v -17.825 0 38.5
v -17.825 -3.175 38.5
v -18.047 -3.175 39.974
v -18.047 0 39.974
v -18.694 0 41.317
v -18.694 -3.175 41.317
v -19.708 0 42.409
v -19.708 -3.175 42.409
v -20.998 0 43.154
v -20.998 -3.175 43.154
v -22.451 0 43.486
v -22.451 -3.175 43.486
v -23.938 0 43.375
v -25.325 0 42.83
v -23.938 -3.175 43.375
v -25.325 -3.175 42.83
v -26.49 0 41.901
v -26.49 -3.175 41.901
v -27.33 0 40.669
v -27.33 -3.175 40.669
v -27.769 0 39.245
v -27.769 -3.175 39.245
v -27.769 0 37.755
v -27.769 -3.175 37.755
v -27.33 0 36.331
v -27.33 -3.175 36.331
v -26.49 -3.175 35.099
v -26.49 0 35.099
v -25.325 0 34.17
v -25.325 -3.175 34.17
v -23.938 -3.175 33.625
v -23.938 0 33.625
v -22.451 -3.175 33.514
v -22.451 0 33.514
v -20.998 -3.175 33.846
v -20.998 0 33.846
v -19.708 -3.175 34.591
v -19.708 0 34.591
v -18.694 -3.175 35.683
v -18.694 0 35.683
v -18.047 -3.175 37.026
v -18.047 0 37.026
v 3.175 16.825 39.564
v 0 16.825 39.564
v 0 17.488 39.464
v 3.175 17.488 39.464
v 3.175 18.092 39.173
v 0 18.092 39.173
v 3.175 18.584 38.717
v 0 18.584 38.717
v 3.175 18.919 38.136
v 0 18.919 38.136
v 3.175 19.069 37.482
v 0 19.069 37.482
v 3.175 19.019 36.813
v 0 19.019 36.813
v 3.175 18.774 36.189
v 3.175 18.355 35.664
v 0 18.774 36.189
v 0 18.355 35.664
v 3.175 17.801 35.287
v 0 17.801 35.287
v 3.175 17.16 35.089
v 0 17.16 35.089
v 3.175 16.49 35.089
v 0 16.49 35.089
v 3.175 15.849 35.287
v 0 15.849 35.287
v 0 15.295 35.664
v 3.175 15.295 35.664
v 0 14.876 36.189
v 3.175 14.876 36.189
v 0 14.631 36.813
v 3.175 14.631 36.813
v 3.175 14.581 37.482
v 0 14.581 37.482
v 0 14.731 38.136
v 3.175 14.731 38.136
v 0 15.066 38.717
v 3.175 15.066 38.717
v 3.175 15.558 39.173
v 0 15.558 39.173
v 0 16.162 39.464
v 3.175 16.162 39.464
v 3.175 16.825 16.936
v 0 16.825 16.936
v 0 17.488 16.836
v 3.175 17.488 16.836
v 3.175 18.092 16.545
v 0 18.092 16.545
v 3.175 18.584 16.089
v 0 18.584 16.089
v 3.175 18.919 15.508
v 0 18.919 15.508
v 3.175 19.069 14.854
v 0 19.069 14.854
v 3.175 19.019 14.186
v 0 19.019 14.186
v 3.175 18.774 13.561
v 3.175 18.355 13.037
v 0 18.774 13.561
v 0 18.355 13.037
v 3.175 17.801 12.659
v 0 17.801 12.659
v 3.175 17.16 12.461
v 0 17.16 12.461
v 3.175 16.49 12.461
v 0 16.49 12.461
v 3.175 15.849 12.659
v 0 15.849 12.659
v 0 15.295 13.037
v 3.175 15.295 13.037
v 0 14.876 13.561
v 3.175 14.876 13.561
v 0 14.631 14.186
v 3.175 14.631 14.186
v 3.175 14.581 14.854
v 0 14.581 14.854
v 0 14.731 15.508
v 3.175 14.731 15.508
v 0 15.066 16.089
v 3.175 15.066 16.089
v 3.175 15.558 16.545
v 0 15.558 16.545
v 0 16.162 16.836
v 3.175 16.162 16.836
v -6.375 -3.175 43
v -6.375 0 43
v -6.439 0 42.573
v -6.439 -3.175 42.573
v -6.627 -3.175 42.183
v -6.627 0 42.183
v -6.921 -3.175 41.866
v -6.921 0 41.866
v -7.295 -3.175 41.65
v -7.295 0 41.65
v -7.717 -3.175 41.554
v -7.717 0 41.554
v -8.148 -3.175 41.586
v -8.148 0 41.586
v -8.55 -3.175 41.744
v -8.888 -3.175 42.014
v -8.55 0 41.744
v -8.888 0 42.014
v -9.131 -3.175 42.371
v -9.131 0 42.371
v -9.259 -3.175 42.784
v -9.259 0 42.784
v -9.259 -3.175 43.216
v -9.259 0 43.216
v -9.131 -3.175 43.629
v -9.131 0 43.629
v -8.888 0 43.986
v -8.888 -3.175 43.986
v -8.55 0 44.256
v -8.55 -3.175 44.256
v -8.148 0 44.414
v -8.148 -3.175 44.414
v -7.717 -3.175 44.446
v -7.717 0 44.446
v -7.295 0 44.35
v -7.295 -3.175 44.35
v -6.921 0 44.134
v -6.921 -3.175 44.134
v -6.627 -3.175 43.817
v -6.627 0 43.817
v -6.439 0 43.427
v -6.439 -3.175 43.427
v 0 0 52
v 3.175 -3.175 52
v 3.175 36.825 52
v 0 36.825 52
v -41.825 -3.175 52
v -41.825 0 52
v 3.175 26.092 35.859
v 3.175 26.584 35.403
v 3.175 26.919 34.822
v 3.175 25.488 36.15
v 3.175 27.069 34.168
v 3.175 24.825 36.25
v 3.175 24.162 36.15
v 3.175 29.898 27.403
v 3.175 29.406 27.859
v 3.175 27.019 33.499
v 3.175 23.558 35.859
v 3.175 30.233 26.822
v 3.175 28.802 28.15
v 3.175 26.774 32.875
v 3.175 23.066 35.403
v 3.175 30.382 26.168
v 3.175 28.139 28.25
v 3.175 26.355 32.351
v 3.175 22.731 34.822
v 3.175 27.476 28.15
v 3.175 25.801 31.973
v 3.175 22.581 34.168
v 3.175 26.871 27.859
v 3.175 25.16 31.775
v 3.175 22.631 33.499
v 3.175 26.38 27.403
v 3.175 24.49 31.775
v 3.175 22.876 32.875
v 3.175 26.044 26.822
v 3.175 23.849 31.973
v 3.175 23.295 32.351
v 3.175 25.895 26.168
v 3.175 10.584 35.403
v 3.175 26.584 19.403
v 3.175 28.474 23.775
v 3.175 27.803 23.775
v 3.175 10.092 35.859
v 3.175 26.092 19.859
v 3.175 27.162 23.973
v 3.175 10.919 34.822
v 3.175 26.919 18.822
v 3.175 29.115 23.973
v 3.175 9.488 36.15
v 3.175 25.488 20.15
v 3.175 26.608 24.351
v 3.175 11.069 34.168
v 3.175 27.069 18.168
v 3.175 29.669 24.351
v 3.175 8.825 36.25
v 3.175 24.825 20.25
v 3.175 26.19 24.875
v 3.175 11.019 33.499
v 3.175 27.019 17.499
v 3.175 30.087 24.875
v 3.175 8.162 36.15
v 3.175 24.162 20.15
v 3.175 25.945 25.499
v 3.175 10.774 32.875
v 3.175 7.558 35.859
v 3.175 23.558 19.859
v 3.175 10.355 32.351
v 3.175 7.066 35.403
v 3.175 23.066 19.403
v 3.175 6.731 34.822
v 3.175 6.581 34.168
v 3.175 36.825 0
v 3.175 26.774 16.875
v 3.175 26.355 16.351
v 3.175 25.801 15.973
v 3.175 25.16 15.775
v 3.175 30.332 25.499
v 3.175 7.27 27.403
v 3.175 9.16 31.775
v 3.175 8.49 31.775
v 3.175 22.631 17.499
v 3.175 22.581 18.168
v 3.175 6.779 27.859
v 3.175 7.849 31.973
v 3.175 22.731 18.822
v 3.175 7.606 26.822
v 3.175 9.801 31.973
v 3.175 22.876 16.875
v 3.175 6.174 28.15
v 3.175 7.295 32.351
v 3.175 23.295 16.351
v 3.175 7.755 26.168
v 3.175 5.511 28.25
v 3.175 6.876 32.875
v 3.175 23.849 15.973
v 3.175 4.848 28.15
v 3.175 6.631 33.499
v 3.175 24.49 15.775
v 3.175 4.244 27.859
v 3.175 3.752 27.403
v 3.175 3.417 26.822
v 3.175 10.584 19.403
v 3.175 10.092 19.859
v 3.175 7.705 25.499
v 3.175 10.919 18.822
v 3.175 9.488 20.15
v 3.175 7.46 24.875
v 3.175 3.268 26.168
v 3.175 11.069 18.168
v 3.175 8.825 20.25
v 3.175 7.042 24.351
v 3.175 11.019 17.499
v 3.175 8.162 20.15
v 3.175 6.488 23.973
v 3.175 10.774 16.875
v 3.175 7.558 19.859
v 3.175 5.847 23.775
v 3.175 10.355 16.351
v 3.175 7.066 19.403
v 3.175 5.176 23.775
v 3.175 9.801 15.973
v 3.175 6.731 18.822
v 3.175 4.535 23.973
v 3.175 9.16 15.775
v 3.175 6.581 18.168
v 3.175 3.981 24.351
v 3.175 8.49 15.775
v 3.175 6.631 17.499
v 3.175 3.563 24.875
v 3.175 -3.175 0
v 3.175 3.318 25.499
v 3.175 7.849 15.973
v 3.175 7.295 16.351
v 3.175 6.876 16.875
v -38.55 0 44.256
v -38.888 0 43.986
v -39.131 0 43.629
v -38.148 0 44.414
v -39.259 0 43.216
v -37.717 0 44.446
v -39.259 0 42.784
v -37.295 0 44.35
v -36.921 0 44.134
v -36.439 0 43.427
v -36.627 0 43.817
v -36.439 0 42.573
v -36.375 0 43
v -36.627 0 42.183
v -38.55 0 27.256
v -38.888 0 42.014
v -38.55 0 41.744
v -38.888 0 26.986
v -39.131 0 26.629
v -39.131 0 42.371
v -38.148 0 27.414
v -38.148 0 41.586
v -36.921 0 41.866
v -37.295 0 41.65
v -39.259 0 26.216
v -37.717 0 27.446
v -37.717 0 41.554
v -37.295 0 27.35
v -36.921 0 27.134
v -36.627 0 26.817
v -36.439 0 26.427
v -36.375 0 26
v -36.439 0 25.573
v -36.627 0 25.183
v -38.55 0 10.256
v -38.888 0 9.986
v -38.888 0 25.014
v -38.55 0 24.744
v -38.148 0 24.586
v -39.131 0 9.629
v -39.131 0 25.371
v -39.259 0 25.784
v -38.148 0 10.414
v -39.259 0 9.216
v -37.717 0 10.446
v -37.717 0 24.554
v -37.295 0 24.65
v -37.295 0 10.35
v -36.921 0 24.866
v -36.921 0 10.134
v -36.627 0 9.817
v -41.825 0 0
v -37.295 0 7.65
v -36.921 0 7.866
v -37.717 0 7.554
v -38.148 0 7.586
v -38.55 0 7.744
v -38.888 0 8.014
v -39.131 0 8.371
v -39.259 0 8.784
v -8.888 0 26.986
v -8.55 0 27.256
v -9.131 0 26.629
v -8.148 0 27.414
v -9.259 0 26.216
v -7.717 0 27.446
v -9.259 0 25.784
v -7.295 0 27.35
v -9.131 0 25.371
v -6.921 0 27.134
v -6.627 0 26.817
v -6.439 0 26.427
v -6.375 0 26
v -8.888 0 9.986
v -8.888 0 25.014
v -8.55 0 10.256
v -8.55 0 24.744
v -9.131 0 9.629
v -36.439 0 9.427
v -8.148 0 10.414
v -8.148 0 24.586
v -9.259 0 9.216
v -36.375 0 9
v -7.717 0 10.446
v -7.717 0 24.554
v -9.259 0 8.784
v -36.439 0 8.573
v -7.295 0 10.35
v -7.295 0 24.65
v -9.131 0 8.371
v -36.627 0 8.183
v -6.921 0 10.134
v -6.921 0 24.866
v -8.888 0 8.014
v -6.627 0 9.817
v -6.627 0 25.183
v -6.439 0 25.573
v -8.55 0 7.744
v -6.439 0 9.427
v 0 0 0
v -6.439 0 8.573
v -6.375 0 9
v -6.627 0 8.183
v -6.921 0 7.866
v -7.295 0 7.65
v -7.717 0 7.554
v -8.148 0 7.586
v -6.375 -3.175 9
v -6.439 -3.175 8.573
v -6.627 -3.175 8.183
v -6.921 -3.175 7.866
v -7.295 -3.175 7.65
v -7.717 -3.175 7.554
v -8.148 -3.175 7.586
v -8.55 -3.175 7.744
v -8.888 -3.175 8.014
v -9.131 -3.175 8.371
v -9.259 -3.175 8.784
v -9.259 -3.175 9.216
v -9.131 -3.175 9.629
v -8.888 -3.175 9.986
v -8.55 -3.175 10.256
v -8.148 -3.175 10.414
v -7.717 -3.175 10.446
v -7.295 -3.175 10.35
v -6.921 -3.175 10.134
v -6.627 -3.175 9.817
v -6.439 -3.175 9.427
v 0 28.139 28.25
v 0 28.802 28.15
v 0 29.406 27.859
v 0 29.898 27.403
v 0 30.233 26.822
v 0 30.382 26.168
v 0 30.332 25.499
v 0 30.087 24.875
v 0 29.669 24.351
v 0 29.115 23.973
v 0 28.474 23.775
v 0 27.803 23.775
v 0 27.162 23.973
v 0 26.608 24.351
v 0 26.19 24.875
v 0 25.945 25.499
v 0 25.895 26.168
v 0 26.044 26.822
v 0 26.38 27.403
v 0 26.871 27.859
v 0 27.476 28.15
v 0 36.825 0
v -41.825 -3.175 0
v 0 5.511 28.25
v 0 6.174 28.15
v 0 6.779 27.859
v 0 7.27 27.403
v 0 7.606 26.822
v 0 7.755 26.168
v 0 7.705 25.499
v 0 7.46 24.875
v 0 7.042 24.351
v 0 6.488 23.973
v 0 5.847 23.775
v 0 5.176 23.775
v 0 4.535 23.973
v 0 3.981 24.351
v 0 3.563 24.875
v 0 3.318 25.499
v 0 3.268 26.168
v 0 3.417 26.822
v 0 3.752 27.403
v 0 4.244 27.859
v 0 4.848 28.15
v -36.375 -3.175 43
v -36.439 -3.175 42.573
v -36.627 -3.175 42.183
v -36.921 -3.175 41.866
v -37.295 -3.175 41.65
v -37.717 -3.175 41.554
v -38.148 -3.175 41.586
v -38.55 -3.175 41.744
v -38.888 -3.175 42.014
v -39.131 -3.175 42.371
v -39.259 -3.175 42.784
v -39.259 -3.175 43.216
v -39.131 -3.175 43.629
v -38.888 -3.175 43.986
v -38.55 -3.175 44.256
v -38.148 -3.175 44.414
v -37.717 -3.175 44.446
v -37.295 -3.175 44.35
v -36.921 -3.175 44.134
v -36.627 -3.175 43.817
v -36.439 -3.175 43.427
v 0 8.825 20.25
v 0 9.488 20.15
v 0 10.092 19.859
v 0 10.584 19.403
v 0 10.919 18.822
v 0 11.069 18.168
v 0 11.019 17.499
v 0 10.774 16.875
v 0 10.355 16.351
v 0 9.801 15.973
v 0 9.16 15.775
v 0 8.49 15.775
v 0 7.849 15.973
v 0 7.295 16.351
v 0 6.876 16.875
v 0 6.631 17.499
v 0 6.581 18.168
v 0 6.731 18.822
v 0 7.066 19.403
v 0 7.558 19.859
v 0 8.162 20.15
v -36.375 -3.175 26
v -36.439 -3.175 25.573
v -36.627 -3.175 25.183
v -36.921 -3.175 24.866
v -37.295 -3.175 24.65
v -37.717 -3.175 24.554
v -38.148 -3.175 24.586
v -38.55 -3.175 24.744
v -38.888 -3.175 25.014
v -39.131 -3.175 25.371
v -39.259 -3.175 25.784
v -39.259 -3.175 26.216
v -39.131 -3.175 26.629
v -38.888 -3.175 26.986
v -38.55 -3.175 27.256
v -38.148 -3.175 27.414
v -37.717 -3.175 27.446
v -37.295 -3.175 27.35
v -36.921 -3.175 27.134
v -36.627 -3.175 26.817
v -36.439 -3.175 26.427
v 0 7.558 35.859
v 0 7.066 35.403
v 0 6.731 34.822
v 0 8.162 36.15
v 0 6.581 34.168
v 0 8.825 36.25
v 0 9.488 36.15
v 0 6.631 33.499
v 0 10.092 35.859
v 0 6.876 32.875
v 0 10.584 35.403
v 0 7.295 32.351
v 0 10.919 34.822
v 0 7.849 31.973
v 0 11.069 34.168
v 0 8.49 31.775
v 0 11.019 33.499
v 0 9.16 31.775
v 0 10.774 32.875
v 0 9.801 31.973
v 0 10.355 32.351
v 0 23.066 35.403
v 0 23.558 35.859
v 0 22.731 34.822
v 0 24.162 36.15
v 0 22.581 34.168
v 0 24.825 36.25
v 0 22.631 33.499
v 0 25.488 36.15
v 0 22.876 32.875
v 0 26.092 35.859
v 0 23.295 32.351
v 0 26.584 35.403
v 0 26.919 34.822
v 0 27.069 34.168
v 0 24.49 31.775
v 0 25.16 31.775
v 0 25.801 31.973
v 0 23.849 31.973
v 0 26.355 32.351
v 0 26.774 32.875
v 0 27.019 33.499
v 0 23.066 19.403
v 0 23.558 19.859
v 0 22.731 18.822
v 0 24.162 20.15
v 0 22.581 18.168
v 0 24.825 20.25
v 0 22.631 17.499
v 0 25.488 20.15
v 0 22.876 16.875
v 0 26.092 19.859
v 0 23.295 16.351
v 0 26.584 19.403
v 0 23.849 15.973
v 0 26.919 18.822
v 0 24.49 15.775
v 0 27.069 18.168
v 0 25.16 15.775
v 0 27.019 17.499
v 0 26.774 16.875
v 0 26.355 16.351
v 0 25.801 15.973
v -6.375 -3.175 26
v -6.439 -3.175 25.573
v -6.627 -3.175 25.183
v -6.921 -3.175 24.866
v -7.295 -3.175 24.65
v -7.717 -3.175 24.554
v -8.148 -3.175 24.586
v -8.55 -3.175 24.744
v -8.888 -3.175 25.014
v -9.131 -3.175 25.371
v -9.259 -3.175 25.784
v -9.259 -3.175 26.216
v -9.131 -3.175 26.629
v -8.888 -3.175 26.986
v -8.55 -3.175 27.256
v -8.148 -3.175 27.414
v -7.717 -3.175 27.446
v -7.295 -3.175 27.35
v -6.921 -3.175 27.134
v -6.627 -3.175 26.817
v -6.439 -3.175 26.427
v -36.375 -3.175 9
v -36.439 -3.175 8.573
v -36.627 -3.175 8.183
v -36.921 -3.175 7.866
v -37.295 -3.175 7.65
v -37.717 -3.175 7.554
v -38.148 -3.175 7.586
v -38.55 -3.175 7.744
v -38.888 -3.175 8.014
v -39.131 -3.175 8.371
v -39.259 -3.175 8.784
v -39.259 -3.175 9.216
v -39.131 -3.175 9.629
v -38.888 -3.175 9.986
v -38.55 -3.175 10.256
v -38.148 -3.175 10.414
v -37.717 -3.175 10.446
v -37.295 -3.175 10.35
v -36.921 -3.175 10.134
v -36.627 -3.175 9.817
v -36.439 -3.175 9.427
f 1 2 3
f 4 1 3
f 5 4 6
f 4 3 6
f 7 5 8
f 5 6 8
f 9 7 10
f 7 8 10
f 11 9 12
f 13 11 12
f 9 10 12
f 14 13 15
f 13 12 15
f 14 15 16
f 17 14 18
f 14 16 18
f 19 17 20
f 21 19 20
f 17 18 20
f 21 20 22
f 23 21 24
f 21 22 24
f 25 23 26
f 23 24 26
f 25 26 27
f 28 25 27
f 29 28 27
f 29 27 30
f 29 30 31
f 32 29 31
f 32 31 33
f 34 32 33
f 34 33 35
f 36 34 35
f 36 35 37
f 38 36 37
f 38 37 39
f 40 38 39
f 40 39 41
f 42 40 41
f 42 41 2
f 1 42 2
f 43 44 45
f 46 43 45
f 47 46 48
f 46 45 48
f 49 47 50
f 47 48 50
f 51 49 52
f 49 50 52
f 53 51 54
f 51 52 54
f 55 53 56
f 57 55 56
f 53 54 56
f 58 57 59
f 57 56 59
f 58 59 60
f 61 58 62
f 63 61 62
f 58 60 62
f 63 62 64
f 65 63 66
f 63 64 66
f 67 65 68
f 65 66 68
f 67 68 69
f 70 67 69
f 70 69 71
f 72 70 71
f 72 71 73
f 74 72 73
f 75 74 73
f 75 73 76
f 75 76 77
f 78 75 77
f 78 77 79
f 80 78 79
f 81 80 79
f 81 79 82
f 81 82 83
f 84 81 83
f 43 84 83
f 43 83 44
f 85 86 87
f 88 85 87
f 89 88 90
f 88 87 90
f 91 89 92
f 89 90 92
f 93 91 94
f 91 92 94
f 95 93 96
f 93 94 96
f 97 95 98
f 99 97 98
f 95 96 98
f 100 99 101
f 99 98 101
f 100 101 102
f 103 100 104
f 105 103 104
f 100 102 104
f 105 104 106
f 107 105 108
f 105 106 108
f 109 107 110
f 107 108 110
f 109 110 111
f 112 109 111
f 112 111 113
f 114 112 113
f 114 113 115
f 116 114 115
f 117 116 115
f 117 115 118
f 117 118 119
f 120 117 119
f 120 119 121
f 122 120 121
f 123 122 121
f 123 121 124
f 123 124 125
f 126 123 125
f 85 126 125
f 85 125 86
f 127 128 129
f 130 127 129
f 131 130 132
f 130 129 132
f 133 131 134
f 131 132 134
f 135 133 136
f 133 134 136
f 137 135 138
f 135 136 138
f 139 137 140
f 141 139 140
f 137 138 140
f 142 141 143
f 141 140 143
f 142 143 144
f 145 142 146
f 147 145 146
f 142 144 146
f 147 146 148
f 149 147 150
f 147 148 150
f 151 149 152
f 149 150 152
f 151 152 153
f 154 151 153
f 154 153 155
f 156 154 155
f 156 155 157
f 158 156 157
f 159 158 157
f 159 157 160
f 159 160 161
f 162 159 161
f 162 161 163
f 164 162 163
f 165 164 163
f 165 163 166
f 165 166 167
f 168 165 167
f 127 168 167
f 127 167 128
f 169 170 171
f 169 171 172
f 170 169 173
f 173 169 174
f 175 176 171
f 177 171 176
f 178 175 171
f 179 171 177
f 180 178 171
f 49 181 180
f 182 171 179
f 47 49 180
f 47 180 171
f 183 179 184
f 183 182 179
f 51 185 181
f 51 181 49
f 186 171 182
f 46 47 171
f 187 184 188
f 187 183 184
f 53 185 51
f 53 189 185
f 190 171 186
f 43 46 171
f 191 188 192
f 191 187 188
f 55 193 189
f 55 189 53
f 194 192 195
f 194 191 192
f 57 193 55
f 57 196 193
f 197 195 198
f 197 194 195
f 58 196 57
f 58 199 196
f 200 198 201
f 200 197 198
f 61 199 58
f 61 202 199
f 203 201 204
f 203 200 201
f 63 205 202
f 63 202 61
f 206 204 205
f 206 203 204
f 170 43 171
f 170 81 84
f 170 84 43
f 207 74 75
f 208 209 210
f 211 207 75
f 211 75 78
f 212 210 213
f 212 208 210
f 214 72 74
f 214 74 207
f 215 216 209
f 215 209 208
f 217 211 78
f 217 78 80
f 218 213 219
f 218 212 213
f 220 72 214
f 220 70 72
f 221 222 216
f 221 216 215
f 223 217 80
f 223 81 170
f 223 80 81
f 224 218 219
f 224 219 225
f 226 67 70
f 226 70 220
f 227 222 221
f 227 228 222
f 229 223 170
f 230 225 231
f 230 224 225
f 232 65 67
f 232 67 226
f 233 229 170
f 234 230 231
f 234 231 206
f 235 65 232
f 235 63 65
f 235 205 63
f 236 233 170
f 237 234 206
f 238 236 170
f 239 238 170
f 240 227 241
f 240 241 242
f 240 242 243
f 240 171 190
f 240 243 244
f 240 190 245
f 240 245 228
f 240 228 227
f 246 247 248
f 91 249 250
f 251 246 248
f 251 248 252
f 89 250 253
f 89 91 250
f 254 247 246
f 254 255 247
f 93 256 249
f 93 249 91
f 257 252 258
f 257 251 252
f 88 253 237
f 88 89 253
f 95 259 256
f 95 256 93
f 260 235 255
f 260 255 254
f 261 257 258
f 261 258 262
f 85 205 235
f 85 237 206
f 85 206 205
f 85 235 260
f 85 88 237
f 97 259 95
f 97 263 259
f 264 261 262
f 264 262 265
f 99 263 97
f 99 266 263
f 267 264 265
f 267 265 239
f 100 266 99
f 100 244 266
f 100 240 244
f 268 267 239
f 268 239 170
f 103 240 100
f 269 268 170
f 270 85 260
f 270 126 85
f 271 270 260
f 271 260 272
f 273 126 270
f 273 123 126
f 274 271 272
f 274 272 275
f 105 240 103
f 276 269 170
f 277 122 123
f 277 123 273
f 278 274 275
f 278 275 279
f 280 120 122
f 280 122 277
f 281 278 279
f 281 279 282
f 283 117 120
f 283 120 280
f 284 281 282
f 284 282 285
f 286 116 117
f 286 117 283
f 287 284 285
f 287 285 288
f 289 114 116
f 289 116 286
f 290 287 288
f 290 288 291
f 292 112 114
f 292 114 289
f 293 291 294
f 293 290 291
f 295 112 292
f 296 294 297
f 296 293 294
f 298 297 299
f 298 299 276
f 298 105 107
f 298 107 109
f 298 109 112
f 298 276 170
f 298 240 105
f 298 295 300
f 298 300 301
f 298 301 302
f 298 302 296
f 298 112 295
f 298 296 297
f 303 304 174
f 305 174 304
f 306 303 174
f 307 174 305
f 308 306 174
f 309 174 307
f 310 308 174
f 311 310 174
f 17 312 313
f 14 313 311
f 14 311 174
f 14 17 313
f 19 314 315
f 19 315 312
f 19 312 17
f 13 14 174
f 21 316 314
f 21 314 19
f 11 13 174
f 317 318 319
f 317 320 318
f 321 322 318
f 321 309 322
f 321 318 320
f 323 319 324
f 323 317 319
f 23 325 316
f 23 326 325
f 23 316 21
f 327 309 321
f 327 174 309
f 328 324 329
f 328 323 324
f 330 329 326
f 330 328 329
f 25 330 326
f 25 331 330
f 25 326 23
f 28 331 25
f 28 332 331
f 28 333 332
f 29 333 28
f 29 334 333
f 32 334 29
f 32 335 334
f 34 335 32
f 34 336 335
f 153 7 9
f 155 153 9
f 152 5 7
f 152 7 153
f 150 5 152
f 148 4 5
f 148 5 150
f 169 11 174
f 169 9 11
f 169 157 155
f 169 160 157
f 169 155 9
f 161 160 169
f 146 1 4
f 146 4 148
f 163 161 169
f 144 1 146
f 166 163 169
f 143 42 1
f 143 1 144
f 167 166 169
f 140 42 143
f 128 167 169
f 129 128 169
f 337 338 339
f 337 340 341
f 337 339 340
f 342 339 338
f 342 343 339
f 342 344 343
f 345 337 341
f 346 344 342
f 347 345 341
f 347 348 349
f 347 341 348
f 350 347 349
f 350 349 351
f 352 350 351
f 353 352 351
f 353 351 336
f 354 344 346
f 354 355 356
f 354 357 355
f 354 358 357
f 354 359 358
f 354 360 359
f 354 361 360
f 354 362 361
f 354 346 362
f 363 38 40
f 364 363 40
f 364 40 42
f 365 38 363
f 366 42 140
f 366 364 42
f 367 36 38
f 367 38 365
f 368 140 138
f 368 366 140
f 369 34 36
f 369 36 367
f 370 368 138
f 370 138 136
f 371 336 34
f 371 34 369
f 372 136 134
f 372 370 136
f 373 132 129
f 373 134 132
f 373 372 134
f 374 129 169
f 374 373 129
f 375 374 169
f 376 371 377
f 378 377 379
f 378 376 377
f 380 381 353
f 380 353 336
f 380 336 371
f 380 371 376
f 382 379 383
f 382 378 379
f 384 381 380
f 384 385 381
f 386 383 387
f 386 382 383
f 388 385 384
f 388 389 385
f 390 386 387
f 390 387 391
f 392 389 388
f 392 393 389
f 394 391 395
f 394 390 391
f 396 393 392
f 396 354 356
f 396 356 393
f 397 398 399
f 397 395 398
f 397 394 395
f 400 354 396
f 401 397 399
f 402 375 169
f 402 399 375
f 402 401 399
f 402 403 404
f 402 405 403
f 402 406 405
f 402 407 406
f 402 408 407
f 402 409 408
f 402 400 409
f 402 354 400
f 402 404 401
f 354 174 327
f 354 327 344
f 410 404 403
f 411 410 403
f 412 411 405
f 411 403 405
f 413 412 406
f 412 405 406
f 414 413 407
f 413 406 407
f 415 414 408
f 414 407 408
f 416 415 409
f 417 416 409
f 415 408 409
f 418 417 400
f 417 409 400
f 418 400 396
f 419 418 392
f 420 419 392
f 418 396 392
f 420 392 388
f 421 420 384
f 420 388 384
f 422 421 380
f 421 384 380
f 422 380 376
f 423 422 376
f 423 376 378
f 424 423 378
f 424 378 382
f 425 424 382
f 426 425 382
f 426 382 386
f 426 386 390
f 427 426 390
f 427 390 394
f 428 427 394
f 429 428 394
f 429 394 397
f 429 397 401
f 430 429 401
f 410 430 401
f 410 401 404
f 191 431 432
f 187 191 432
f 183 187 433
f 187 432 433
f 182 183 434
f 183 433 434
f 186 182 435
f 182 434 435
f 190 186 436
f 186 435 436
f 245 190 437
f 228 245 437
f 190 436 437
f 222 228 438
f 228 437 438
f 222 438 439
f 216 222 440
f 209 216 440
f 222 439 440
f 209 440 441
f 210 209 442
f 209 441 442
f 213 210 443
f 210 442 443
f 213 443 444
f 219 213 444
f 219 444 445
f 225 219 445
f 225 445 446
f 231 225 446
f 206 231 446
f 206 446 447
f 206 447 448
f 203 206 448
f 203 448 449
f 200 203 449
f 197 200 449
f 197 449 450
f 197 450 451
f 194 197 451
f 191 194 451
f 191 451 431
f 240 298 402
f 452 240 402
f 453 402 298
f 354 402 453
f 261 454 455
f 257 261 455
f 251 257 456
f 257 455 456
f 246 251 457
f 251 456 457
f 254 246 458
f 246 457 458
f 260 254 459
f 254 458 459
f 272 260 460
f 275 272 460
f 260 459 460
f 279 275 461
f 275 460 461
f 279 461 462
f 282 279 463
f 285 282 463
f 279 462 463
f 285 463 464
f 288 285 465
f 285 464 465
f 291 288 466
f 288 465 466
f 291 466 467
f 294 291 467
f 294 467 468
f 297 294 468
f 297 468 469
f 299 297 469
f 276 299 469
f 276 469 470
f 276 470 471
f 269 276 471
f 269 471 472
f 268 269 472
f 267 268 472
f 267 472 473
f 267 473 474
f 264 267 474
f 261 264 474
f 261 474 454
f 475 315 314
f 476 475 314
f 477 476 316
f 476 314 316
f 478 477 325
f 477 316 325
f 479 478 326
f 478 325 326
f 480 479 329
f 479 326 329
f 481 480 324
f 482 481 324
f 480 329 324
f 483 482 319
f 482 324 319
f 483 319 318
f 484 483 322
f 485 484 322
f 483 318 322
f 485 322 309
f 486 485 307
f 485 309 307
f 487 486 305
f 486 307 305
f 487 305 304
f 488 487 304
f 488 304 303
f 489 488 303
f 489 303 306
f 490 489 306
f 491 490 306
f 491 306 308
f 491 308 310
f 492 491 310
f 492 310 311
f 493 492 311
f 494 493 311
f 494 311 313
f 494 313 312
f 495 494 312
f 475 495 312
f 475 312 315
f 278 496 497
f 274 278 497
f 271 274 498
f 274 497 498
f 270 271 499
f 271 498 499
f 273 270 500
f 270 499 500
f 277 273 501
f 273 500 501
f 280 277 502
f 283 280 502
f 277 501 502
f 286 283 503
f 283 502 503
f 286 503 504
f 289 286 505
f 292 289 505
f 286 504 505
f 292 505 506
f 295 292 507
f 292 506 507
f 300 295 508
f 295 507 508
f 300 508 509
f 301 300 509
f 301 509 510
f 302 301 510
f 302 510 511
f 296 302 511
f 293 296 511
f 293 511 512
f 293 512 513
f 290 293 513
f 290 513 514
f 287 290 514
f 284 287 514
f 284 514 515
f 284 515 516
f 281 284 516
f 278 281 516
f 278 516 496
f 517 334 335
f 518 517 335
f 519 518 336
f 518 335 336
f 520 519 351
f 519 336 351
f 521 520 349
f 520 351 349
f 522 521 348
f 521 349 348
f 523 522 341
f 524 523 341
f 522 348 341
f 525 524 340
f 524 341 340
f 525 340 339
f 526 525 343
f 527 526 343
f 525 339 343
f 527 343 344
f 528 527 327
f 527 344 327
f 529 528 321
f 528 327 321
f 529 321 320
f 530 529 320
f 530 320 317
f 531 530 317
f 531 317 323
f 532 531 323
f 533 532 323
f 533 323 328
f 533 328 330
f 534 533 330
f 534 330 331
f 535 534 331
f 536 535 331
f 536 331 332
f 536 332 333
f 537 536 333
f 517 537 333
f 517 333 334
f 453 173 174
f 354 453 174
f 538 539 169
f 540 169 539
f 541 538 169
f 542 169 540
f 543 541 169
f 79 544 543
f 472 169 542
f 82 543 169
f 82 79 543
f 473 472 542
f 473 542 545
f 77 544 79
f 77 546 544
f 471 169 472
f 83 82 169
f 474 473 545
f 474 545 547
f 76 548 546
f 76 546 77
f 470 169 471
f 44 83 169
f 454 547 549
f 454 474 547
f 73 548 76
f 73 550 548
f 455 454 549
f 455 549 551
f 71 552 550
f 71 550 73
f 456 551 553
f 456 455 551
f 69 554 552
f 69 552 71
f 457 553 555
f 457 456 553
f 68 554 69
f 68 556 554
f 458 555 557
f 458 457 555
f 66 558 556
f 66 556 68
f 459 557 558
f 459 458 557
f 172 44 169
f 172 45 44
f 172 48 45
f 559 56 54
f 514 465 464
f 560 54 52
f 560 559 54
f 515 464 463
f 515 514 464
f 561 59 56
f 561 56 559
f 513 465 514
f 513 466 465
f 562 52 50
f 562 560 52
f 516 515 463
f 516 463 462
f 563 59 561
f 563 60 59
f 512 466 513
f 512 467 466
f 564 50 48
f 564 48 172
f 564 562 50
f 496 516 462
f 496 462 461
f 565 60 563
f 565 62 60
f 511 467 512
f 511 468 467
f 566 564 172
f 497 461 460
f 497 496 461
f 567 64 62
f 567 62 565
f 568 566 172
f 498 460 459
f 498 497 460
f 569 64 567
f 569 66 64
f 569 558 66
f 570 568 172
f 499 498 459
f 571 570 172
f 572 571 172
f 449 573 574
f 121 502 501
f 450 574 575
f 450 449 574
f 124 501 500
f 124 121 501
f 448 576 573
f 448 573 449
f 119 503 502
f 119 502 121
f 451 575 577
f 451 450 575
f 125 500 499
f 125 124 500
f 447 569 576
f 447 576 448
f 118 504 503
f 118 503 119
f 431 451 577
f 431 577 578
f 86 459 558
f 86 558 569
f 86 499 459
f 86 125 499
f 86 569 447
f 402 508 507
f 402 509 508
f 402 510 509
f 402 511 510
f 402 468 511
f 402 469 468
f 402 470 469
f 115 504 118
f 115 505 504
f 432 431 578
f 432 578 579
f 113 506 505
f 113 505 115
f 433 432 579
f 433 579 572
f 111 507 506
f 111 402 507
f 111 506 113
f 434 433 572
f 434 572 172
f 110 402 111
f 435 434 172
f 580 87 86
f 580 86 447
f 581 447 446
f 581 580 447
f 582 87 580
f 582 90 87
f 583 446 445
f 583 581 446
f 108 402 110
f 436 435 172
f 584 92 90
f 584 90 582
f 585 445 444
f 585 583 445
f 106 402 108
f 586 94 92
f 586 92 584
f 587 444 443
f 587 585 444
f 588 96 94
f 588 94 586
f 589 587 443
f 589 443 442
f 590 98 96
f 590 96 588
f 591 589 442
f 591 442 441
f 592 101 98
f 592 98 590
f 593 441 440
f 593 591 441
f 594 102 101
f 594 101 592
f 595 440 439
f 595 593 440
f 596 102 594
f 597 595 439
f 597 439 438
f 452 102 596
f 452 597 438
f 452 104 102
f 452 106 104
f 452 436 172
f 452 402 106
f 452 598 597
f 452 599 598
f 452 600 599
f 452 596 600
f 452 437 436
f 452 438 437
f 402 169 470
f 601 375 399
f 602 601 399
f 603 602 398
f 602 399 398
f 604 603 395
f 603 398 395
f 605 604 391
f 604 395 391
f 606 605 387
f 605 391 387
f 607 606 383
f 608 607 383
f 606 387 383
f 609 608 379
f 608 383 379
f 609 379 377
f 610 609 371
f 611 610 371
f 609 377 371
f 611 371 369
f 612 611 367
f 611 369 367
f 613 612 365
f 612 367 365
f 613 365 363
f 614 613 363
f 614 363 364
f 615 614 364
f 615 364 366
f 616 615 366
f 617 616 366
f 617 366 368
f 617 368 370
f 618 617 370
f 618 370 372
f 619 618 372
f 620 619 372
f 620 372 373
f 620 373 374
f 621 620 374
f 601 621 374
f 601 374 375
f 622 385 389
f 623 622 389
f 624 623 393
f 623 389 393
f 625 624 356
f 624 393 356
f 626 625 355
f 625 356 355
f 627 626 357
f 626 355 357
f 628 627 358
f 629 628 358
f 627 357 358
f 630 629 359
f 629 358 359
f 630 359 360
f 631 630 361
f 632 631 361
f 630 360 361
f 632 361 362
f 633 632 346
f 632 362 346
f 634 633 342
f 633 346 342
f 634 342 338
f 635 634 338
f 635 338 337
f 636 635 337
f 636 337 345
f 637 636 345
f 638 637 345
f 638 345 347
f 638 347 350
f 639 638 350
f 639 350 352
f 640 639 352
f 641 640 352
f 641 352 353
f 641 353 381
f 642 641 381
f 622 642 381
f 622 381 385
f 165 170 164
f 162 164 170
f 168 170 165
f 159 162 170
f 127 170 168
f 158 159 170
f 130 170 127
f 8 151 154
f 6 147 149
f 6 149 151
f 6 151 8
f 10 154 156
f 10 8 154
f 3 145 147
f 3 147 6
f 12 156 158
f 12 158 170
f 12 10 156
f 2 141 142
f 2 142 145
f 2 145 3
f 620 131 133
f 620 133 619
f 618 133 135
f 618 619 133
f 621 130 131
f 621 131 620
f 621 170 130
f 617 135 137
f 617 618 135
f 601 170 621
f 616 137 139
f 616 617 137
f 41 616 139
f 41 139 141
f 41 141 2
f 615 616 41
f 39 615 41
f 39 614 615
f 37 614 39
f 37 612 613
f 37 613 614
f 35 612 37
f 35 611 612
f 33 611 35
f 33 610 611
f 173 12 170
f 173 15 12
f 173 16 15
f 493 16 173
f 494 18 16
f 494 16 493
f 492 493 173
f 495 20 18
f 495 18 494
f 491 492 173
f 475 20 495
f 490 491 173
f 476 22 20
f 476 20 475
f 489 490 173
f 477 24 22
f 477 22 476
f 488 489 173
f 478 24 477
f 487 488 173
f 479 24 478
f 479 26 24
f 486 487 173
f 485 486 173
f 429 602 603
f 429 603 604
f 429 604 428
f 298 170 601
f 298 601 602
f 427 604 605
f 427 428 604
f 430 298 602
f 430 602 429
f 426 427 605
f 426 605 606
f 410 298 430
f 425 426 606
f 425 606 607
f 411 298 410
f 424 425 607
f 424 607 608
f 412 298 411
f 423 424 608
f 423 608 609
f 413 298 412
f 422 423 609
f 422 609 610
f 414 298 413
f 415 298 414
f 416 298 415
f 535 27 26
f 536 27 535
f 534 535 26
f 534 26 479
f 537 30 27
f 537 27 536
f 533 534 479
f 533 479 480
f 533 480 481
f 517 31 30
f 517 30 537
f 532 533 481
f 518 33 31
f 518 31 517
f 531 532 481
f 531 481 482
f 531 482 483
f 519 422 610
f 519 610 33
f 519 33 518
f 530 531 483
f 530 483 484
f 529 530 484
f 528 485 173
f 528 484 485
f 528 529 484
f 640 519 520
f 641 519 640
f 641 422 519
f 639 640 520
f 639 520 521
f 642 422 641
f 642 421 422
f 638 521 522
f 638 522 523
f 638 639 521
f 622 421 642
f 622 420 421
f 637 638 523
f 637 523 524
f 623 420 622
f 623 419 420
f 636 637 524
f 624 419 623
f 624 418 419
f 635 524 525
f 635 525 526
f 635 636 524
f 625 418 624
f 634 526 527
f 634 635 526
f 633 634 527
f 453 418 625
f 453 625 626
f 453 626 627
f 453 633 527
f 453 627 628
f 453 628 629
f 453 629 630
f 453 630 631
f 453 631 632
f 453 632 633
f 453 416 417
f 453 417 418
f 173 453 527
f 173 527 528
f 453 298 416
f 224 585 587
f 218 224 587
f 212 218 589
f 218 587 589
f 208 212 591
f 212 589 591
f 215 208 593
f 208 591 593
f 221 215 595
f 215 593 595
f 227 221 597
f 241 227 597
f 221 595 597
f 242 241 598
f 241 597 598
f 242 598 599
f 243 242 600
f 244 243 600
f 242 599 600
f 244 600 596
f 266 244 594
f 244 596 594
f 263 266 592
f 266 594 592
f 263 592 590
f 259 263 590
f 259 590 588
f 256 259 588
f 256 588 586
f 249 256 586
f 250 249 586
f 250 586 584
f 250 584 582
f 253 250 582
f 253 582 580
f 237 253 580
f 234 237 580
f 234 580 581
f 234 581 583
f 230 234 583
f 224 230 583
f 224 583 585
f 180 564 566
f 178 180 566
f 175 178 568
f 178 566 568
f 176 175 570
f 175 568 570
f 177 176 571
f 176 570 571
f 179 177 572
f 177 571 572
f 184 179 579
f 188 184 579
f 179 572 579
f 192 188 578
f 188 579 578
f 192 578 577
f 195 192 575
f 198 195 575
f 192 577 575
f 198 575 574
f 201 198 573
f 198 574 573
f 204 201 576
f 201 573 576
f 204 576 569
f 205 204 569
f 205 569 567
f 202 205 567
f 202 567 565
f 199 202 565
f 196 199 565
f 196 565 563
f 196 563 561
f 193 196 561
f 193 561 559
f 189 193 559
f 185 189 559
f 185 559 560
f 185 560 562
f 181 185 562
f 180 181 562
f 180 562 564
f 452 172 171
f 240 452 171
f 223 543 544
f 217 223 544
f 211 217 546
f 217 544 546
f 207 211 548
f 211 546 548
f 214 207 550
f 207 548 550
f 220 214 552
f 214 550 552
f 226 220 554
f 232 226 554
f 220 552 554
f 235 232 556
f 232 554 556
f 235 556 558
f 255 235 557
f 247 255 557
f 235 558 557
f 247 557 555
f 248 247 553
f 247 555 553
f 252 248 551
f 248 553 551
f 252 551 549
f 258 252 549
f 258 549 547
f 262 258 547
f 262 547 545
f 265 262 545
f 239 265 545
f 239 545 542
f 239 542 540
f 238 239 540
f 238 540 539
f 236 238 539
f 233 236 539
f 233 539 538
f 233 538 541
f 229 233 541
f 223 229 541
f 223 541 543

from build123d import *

# Parameters (mm, degrees)
BOSS_EXTRUDE1_DEPTH    = 52
SKETCH3_R              = 5
CUT_EXTRUDE2_DEPTH     = 78.803153053
M2_5_CLEARANCE_HOLE1_D = 2.9
M4_CLEARANCE_HOLE1_D   = 4.5


with BuildPart() as part:
    # Sketch1 → Boss-Extrude1 (new body)
    with BuildSketch(Plane.XY):
        Polygon((0, 0), (0, 36.825), (3.175, 36.825), (3.175, -3.175), (-41.825, -3.175), (-41.825, 0), align=None)
    extrude(amount=BOSS_EXTRUDE1_DEPTH)

    # Sketch3 → Cut-Extrude2 (cut, through all)
    with BuildSketch(Plane(origin=(0, -3.175, 0), x_dir=(-1, 0, 0), z_dir=(0, -1, 0))):
        with Locations(Location((22.825, -38.5, 0), (0, 0, 180))):
            Circle(SKETCH3_R)
    extrude(amount=-CUT_EXTRUDE2_DEPTH, mode=Mode.SUBTRACT)

    # M2.5 Clearance Hole1 (through all)
    with Locations(Plane(origin=(0, -3.175, 0), x_dir=(-1, 0, 0), z_dir=(0, -1, 0))):
        with Locations((7.825, -9), (37.825, -9), (7.825, -26), (37.825, -26), (37.825, -43), (7.825, -43)):
            Hole(M2_5_CLEARANCE_HOLE1_D / 2)

    # M4 Clearance Hole1 (through all)
    with Locations(Plane(origin=(3.175, 0, 0), x_dir=(0, 0, -1), z_dir=(1, 0, 0))):
        with Locations((-26, 28.138708499), (-18, 24.825), (-14.686291501, 16.825), (-18, 8.825), (-26, 5.511291501), (-34, 8.825), (-37.313708499, 16.825), (-34, 24.825)):
            Hole(M4_CLEARANCE_HOLE1_D / 2)


solid = part.part
